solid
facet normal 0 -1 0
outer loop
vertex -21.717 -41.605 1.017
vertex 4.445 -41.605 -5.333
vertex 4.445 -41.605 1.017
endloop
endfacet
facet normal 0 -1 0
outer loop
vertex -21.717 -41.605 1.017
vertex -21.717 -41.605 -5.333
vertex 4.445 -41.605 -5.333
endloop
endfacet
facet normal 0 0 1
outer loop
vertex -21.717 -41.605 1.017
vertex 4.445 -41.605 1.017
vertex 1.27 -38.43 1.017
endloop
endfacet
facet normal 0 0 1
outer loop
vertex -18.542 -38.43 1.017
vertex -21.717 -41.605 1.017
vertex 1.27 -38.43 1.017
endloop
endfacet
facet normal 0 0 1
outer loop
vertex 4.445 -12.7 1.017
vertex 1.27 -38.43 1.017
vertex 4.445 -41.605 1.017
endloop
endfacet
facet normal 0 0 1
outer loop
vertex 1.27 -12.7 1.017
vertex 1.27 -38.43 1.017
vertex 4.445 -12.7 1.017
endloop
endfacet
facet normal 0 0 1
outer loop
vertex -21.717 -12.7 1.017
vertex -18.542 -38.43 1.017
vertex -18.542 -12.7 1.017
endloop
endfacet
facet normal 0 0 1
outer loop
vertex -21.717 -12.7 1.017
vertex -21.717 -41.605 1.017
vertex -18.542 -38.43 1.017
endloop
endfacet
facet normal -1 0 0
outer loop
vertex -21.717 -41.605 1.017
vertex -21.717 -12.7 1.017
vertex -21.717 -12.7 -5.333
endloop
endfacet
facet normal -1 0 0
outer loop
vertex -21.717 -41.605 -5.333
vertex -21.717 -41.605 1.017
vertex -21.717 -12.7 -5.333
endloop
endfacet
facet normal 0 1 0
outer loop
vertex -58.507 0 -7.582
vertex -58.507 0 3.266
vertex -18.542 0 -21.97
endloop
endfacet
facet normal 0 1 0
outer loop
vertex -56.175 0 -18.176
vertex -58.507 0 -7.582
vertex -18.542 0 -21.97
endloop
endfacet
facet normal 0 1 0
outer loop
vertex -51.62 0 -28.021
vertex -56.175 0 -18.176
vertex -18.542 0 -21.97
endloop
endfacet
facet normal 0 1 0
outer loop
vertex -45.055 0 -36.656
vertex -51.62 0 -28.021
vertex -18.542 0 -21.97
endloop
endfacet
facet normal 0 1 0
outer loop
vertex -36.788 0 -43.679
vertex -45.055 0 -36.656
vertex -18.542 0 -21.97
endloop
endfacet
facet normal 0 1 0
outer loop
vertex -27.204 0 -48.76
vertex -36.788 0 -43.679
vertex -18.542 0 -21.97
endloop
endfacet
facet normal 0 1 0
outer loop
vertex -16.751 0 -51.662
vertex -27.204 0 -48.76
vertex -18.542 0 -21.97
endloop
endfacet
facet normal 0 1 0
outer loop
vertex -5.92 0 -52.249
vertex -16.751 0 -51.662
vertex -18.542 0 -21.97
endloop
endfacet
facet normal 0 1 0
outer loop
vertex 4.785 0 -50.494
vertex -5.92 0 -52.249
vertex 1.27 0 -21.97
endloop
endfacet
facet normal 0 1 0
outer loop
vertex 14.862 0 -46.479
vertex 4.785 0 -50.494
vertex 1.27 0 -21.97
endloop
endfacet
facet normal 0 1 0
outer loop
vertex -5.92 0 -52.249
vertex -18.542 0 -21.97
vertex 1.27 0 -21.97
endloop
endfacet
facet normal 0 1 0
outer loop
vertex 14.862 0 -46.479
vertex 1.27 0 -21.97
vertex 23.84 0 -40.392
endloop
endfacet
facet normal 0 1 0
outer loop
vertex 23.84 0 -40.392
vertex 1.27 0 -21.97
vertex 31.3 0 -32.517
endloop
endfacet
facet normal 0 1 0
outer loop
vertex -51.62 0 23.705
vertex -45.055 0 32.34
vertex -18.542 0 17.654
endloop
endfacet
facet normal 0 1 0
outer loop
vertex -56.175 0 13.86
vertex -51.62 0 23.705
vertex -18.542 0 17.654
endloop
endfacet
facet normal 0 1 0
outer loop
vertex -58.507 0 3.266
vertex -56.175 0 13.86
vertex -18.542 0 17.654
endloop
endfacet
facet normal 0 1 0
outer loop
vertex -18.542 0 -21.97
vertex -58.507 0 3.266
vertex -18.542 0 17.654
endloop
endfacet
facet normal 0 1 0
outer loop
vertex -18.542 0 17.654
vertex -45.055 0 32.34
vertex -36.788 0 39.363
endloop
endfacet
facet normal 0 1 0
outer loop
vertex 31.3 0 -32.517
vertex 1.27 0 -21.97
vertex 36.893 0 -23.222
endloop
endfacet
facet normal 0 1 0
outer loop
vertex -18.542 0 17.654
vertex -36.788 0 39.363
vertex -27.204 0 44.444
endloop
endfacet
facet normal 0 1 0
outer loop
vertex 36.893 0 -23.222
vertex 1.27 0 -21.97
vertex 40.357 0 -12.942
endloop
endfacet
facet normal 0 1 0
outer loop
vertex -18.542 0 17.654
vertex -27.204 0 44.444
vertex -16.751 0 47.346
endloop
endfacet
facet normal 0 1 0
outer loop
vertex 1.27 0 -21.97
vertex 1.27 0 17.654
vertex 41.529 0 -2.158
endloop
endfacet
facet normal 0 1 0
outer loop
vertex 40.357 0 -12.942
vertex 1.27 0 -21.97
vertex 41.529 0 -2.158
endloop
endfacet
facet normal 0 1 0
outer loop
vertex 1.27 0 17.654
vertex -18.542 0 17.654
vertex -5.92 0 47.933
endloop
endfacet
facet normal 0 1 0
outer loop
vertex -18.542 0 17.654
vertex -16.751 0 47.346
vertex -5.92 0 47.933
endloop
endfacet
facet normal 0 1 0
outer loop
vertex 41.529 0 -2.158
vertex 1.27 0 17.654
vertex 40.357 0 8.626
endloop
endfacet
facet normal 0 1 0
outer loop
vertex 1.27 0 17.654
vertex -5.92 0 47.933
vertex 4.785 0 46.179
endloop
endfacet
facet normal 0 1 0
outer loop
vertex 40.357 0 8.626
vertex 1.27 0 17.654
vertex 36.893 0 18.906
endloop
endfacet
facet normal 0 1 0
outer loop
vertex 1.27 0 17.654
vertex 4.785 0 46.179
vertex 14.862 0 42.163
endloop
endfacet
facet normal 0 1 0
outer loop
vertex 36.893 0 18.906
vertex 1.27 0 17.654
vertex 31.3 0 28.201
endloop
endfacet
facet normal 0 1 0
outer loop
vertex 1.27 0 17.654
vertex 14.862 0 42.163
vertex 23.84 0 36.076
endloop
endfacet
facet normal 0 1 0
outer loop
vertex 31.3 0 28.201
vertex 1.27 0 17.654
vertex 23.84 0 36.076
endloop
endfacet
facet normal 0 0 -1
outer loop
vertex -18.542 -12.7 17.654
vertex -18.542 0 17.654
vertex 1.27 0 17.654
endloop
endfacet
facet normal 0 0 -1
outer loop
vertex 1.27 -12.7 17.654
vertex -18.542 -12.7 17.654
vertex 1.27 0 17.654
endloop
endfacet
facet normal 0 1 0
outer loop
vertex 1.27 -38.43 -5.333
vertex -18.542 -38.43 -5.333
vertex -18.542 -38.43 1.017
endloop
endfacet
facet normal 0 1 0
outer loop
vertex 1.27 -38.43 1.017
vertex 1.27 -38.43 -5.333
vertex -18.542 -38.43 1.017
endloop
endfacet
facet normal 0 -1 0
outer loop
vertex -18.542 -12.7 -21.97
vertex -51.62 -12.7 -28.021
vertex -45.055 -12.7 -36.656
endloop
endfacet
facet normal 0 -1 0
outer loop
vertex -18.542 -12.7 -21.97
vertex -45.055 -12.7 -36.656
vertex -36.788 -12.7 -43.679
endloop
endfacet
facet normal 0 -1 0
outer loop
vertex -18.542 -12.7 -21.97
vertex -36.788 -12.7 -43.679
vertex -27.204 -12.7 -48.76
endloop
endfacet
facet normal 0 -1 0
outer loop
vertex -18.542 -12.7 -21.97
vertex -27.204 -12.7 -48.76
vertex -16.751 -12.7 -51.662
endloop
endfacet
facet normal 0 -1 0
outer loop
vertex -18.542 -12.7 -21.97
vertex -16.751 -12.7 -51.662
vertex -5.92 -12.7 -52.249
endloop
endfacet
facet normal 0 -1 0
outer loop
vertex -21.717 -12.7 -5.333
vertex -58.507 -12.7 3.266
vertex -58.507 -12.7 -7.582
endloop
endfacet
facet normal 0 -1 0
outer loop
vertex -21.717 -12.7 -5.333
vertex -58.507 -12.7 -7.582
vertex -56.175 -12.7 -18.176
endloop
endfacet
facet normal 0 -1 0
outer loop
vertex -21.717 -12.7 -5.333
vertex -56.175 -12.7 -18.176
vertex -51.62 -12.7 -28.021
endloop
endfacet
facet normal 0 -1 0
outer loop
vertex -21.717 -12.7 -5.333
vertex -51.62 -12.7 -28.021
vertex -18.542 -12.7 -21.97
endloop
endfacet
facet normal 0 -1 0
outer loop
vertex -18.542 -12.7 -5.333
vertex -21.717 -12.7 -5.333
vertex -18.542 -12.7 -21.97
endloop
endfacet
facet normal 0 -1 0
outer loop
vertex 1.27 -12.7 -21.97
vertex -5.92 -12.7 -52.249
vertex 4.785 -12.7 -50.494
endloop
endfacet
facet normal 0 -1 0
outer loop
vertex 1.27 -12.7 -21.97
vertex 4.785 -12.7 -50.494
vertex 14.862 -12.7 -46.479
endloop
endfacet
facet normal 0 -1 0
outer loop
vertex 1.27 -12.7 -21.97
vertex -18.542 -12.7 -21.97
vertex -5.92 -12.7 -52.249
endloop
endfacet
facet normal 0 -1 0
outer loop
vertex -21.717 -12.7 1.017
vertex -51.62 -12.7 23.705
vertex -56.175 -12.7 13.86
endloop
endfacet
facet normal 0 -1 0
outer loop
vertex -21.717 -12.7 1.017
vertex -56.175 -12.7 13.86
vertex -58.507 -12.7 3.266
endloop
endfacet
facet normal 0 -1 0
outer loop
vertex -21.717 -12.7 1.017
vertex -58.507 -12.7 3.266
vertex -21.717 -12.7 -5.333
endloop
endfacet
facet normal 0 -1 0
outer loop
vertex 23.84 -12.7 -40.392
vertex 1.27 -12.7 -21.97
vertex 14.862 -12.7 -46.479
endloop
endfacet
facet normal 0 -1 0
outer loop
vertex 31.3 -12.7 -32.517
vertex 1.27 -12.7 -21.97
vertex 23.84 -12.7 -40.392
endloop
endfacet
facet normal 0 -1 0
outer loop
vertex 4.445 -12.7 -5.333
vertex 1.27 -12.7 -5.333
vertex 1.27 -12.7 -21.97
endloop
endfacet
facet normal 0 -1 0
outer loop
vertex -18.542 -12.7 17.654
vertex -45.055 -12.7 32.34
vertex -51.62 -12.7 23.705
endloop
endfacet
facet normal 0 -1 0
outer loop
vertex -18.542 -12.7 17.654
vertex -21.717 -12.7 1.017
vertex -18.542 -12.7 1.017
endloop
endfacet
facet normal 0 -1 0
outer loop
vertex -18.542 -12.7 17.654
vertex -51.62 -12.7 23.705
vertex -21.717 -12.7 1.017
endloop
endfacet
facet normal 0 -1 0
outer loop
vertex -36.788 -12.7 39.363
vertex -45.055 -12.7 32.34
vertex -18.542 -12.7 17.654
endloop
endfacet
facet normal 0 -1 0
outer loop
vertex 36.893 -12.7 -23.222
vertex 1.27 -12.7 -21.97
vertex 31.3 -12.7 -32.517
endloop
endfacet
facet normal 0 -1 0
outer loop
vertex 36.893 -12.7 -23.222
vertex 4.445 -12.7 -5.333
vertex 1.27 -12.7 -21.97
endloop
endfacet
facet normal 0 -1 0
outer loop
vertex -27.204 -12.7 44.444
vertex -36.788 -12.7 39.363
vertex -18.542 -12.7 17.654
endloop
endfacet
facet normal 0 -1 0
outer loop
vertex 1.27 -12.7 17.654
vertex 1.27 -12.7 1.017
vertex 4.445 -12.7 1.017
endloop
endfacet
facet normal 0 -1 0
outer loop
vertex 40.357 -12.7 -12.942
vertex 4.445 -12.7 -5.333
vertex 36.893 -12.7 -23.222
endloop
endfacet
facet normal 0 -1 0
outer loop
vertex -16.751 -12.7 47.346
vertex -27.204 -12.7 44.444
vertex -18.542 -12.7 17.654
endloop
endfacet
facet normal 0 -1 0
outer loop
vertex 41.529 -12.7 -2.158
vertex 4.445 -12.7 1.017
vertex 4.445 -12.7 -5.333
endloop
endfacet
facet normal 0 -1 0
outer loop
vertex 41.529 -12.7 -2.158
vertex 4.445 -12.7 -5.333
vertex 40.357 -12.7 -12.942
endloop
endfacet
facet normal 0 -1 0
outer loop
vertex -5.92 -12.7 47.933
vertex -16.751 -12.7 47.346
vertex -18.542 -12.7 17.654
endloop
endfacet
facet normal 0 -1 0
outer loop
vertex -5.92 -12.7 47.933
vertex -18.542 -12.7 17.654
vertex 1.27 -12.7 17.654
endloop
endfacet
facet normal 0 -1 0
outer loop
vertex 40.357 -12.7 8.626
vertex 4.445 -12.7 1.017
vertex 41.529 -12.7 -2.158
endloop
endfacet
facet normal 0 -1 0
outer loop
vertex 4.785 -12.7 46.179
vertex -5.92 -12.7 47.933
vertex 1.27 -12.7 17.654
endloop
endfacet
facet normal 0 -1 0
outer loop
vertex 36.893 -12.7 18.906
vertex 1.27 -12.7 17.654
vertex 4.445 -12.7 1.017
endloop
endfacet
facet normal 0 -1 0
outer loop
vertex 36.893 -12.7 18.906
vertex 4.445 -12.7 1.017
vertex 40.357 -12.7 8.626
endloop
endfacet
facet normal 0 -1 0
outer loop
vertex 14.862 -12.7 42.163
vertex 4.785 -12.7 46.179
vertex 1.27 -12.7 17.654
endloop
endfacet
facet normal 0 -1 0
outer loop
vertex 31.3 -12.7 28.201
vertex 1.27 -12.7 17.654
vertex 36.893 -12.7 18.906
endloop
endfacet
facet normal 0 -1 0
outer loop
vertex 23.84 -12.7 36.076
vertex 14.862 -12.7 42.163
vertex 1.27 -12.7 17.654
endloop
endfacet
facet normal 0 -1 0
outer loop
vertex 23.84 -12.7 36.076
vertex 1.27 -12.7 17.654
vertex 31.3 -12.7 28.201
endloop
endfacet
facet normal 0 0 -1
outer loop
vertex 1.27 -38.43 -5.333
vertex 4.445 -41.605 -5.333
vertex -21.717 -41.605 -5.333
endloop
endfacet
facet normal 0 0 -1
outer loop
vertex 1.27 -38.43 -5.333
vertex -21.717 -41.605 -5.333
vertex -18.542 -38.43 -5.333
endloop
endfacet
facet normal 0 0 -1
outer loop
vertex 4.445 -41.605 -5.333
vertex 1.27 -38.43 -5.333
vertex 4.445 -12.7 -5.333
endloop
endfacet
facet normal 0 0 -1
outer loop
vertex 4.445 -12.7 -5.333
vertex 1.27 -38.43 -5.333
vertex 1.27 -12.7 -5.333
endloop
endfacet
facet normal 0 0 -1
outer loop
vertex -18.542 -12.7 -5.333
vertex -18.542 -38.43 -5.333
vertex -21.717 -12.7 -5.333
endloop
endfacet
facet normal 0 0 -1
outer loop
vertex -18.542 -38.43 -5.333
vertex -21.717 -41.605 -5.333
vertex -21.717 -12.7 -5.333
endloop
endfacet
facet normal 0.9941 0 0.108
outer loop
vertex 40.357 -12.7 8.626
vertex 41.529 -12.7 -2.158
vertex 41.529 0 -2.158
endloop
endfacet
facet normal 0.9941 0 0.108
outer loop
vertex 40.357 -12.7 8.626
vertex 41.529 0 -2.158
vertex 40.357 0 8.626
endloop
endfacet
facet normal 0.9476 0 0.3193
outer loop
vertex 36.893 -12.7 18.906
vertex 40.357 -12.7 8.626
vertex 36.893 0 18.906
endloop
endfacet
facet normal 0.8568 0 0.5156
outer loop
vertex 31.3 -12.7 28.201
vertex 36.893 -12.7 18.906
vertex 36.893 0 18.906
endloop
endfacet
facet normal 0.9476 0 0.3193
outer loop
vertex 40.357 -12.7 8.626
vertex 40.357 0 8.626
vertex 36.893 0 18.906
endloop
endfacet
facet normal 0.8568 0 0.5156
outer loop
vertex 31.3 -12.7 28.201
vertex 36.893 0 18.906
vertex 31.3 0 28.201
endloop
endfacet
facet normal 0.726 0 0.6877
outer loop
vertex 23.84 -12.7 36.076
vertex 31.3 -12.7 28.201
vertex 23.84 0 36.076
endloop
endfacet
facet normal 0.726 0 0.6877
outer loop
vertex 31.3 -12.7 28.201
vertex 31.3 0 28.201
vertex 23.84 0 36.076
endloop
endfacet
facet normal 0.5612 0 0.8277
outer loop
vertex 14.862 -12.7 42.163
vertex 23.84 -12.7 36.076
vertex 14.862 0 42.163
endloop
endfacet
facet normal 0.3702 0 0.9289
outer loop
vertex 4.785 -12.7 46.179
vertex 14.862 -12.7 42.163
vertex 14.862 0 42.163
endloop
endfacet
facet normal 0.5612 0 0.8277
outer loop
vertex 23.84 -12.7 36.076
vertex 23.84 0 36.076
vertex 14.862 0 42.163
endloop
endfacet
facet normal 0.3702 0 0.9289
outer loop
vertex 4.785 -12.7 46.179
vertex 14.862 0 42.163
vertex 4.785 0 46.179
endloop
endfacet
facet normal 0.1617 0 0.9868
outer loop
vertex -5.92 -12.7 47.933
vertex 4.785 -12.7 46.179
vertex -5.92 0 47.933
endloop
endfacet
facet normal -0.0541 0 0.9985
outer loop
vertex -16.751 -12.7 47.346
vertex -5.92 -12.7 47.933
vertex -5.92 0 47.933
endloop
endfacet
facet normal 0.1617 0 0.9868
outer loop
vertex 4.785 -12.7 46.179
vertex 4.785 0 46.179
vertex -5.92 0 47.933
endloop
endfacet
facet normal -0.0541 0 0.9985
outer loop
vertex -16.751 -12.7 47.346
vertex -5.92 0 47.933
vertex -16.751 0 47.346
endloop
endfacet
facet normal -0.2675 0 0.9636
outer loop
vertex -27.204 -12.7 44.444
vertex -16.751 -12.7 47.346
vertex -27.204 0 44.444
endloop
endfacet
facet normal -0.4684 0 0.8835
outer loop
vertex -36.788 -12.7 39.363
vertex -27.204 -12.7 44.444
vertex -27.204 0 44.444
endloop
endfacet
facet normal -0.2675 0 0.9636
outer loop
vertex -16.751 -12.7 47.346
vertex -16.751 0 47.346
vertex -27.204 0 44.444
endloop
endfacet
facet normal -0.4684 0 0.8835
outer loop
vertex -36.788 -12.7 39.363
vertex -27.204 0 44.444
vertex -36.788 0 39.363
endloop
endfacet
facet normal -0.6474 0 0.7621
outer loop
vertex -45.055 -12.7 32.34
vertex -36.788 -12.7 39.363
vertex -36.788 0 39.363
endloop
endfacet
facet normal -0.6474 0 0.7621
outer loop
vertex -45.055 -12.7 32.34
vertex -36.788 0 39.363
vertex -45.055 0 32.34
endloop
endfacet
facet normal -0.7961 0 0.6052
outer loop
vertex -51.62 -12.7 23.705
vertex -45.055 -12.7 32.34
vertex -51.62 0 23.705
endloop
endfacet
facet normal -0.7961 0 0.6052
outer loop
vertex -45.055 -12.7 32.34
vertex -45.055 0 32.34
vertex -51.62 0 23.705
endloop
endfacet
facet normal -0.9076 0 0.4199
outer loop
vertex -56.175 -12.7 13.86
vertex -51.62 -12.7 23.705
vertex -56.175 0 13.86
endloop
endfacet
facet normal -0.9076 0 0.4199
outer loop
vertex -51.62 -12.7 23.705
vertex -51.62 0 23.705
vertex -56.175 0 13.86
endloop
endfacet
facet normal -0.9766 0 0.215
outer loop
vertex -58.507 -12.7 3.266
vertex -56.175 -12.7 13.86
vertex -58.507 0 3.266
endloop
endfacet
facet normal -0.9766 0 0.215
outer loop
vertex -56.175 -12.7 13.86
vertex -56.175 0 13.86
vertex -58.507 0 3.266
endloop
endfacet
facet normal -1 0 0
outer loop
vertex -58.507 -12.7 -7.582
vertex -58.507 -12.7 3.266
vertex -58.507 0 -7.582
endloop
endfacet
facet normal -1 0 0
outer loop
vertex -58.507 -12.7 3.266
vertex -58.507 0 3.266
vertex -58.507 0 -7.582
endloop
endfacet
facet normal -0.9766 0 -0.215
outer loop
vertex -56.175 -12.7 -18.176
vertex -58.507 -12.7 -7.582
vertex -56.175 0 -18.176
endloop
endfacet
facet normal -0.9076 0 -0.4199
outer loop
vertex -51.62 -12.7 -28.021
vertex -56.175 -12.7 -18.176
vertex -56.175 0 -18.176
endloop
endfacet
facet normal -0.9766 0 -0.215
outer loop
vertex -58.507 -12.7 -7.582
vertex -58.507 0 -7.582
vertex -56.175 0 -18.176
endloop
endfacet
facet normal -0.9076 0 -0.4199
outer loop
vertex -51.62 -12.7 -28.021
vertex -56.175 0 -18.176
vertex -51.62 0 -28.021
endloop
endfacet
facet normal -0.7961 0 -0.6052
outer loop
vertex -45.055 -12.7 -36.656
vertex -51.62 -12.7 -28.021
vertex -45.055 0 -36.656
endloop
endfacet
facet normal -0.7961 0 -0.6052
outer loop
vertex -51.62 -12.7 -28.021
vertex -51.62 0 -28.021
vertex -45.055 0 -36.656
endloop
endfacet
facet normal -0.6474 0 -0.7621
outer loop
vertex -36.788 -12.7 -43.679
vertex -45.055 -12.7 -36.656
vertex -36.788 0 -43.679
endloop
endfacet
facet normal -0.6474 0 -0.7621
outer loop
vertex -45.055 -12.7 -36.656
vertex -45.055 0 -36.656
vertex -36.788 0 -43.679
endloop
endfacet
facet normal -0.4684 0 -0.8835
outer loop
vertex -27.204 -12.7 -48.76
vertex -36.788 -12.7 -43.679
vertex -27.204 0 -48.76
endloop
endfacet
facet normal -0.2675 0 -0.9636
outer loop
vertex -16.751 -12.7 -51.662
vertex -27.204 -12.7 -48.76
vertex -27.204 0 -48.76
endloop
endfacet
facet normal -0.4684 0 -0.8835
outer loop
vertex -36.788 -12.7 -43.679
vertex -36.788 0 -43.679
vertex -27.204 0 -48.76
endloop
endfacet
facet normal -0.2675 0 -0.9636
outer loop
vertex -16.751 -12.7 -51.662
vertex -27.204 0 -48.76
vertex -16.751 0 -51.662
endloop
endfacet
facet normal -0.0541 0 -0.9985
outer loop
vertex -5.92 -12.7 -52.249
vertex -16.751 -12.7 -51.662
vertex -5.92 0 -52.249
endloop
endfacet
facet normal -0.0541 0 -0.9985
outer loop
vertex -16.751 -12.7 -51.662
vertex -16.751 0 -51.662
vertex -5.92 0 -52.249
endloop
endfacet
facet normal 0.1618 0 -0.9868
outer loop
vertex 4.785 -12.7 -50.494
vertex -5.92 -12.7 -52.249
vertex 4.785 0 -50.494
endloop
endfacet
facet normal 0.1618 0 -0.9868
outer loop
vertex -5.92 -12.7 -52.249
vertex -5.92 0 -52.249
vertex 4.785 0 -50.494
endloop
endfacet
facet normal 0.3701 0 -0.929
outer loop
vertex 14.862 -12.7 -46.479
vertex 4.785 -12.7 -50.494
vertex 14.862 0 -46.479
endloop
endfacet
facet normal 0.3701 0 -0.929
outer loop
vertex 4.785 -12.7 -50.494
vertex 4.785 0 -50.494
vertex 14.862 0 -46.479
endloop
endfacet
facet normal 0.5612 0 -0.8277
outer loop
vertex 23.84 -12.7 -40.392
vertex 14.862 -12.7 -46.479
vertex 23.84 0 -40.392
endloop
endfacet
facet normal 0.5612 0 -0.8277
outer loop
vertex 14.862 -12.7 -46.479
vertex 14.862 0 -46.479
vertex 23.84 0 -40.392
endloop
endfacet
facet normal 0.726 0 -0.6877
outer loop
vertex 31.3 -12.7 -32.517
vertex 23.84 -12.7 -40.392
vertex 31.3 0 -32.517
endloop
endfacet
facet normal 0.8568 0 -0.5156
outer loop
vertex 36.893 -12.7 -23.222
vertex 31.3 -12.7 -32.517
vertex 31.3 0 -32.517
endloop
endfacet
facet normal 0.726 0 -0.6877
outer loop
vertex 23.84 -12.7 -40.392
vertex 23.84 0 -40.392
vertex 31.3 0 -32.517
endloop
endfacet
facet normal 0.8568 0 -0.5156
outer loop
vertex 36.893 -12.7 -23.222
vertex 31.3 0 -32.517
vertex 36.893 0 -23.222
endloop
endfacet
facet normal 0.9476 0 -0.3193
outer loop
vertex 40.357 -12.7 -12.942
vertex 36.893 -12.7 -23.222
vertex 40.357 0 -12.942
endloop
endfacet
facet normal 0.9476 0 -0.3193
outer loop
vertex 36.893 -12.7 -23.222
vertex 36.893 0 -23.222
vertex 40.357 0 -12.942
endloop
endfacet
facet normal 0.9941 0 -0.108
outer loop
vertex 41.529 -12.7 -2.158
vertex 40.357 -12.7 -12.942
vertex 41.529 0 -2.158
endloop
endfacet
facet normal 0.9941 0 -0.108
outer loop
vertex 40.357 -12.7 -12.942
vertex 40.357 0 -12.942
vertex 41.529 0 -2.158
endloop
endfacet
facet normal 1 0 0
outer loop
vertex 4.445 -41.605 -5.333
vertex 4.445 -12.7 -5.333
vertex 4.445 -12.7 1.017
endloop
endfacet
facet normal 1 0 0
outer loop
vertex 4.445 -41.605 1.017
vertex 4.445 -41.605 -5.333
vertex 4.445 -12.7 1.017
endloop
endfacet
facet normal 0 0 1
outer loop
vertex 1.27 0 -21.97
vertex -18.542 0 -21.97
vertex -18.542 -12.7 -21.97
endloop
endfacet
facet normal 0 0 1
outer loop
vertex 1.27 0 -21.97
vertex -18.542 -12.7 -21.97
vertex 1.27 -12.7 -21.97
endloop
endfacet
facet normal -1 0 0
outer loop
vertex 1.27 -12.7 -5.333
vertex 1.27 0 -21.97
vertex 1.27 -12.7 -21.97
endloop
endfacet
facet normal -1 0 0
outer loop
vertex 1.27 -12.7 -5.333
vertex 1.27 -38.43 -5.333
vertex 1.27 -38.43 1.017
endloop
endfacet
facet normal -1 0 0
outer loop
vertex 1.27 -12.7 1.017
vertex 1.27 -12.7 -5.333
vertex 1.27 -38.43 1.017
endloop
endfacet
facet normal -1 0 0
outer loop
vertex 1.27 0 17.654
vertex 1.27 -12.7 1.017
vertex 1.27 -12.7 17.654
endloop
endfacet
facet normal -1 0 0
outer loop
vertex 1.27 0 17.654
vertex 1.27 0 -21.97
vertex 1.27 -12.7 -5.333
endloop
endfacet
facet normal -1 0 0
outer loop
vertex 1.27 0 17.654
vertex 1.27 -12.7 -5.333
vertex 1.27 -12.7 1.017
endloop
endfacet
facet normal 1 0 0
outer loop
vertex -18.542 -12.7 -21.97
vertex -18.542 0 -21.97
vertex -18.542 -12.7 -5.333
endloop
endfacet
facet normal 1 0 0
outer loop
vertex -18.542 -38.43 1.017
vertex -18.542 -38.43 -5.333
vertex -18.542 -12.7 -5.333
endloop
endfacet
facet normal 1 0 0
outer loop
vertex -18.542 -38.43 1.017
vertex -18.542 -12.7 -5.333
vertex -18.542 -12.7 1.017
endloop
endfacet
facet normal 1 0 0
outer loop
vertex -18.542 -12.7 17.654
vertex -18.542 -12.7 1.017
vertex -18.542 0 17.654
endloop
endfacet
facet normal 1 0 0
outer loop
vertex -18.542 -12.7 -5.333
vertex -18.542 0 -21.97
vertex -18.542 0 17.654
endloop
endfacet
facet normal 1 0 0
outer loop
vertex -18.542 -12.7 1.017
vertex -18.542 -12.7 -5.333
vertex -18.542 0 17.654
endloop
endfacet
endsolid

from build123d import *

# Parameters (mm, degrees)
F0_R     = 50.165
F0_W     = 19.812
F0_H     = 39.624
F1_DEPTH = 12.7
F3_DEPTH = 28.9052
F4_W     = 3.175
F4_H     = 6.35
F5_DEPTH = 19.812


with BuildPart() as f1:
    # F0 (on Front) → F1 (new body)
    with BuildSketch(Plane.XZ):
        with Locations((-8.635654, -2.157946)):
            Circle(F0_R)
        with Locations((-8.635654, -2.157946)):
            Rectangle(F0_W, F0_H, mode=Mode.SUBTRACT)
    extrude(amount=F1_DEPTH)

    # F2 (on face) → F3 (join)
    with BuildSketch(Plane.XZ.offset(12.7)):
        Polygon((-18.541654, -2.157946), (-18.541654, 1.017054), (-21.716654, 1.017054), (-21.716654, -2.157946), (-21.716654, -5.332946), (-18.541654, -5.332946), align=None)
        Polygon((4.445346, 1.017054), (1.270346, 1.017054), (1.270346, -2.157946), (1.270346, -5.332946), (4.445346, -5.332946), (4.445346, -2.157946), align=None)
    extrude(amount=F3_DEPTH)

    # F4 (on face) → F5 (join)
    with BuildSketch(Plane.YZ.offset(-18.541654)):
        with Locations((-40.0177, -2.157946)):
            Rectangle(F4_W, F4_H)
    extrude(amount=F5_DEPTH)


solid = f1.part
